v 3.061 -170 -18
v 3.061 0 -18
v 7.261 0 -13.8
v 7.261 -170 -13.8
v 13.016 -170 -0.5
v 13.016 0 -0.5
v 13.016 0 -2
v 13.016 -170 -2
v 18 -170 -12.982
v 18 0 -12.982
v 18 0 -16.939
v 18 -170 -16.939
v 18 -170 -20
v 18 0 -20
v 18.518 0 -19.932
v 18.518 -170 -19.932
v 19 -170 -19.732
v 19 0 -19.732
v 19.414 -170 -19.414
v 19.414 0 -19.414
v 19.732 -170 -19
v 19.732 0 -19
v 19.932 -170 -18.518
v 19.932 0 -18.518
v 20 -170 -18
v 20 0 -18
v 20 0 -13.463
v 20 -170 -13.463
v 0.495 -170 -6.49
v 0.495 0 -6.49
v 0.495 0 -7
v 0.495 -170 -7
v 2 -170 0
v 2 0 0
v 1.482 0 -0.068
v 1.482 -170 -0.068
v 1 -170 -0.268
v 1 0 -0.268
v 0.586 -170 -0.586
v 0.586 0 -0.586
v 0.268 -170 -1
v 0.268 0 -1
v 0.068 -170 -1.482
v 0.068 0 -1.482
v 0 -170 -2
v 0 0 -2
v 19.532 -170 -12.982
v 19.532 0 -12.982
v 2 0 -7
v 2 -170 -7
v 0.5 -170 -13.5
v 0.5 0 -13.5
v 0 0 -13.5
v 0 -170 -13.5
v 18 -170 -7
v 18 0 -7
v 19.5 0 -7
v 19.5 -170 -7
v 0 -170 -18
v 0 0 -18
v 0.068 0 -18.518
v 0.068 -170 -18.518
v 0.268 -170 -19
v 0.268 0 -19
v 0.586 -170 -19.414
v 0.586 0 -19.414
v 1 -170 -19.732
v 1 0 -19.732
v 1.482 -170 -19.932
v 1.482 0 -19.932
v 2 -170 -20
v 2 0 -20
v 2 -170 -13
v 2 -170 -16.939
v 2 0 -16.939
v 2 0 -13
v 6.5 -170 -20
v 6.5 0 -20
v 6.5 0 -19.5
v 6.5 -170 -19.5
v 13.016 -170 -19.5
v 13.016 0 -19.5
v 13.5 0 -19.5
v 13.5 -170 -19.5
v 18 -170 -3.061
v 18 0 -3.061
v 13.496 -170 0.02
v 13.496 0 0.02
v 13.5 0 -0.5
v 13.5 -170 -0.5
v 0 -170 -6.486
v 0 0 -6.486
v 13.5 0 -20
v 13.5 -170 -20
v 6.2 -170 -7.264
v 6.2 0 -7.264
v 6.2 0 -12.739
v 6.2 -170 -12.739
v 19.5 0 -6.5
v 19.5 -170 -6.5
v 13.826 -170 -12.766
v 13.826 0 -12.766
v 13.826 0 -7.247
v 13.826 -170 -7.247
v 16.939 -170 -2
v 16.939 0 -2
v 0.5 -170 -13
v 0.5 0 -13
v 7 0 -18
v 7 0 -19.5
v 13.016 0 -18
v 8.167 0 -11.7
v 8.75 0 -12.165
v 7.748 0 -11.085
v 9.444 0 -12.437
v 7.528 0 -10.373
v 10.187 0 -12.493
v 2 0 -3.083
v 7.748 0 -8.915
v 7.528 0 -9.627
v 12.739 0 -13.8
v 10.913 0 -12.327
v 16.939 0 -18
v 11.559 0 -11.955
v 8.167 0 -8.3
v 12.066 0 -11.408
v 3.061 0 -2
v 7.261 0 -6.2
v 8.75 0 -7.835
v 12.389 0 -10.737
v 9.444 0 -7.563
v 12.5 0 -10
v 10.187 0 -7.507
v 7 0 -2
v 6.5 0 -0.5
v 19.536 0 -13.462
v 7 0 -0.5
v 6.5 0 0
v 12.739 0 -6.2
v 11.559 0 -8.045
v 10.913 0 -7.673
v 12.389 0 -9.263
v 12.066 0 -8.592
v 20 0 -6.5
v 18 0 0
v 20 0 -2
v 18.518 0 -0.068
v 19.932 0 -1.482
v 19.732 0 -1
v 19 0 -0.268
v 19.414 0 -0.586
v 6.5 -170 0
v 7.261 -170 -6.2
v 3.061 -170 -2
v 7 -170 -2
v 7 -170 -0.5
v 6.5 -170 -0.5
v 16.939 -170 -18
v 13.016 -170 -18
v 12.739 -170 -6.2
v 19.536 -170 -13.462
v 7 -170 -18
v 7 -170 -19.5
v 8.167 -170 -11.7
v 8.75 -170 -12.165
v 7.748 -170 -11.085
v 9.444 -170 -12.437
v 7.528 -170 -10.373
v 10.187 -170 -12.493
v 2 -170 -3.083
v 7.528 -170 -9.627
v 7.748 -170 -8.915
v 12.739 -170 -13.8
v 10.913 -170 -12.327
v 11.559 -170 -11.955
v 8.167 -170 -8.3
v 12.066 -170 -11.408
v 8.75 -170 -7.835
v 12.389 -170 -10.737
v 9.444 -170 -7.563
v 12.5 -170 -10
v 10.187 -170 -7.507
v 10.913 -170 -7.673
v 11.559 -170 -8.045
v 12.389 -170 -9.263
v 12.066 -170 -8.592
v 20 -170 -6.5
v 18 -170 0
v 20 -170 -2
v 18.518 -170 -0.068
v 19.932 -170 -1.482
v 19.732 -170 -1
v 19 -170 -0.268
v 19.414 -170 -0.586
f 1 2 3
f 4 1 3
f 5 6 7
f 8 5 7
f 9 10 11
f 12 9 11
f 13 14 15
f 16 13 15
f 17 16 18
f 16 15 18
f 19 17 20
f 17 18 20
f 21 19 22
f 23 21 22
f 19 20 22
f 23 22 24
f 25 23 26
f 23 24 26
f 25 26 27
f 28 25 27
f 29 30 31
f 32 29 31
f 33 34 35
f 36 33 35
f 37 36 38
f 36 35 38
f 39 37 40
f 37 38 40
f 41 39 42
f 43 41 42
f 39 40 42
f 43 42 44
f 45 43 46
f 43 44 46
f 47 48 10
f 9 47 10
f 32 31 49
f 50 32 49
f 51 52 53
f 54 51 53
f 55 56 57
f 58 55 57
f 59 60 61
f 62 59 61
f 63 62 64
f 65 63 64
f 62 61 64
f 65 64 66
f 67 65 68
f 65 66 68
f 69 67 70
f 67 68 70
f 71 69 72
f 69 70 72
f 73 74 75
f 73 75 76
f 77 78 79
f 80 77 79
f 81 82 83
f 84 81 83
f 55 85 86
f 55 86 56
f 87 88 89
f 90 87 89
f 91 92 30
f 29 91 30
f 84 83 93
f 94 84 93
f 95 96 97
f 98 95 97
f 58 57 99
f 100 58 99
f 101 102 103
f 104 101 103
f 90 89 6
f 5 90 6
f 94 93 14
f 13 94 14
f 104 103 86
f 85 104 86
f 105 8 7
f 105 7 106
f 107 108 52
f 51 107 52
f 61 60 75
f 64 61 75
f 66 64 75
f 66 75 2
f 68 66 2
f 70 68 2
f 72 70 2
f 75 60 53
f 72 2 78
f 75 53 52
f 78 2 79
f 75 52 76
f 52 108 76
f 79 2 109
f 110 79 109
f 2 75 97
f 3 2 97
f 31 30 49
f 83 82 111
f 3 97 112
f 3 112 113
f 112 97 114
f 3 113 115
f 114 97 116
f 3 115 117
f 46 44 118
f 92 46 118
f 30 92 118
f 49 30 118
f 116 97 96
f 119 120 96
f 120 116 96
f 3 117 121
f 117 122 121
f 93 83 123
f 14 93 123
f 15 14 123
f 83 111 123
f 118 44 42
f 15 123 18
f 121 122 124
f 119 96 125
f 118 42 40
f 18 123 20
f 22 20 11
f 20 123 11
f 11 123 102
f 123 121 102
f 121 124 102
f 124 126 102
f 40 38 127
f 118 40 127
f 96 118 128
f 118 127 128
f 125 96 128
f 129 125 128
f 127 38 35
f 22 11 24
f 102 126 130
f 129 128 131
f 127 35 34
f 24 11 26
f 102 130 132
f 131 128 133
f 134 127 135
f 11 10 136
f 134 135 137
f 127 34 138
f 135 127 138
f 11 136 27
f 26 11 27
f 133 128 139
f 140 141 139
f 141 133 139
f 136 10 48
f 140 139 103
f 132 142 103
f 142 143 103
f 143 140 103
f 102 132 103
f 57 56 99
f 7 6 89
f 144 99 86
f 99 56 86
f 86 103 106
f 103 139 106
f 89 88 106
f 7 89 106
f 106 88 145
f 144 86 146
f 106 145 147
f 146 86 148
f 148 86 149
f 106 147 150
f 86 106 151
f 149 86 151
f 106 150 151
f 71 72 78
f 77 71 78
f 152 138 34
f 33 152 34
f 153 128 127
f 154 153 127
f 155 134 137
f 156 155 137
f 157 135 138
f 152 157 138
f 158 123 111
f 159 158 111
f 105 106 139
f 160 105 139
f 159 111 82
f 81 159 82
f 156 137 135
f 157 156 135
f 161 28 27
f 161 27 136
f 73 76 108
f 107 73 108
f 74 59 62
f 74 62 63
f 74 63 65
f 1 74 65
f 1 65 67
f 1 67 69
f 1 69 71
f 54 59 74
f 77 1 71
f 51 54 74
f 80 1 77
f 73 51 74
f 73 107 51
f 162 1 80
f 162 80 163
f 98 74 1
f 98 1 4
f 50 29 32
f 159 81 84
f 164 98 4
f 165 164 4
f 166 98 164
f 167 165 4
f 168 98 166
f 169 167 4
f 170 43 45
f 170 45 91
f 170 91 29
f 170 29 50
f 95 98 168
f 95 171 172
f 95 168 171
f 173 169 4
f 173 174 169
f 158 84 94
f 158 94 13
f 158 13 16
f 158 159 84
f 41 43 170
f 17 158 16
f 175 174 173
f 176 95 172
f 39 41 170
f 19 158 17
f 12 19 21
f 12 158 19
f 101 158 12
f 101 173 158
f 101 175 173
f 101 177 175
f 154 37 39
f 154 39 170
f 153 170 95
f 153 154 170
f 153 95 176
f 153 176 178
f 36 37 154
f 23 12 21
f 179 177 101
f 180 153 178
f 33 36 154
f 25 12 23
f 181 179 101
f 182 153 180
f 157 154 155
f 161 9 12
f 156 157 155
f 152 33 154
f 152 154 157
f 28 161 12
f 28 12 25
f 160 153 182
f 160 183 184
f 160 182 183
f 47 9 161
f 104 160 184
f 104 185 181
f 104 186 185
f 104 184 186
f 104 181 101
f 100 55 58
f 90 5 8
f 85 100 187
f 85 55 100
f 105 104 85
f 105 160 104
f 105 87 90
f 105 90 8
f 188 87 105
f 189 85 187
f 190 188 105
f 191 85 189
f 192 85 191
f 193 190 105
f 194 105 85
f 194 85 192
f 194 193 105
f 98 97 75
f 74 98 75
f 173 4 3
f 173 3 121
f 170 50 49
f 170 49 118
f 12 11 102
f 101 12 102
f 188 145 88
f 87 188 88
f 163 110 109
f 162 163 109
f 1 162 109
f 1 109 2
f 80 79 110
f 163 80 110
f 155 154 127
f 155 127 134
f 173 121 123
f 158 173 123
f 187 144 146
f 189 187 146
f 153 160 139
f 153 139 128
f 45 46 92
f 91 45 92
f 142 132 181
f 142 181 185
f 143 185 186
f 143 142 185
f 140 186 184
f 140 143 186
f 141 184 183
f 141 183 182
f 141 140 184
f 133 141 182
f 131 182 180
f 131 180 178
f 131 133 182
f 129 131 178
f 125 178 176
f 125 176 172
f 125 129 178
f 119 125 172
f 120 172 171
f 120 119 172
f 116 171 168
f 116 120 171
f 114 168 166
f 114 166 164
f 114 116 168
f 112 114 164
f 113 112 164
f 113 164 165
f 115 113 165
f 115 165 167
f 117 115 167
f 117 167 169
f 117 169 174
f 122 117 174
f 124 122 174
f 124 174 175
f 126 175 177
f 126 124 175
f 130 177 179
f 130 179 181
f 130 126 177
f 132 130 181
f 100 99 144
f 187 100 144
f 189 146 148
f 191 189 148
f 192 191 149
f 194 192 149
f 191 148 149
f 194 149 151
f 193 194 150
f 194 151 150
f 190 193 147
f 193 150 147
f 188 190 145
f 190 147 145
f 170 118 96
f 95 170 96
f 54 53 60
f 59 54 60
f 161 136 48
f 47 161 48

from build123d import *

# Parameters (mm, degrees)
F0_R     = 2.5
F2_DEPTH = 170


with BuildPart() as f2:
    # F0 (on Front) → F2 (new body)
    with BuildSketch(Plane.XZ):
        with BuildLine():
            Line((6.5, 0), (2, 0))
            ThreePointArc((2, 0), (0.5857864376, -0.5857864376), (0, -2))
            Line((0, -2), (0, -6.4857100192))
            Line((0, -6.4857100192), (0.4948230833, -6.489995392))
            Line((0.4948230833, -6.489995392), (0.4948230833, -7))
            Line((0.4948230833, -7), (2, -7))
            Line((2, -7), (2, -3.0833937817))
            Line((2, -3.0833937817), (6.2, -7.2637052917))
            Line((6.2, -7.2637052917), (6.2, -12.7393398282))
            Line((6.2, -12.7393398282), (2, -16.9393398282))
            Line((2, -16.9393398282), (2, -13))
            Line((2, -13), (0.5, -13))
            Line((0.5, -13), (0.5, -13.5))
            Line((0.5, -13.5), (0, -13.5))
            Line((0, -13.5), (0, -18))
            ThreePointArc((0, -18), (0.5857864376, -19.4142135624), (2, -20))
            Line((2, -20), (6.5, -20))
            Line((6.5, -20), (6.5, -19.5))
            Line((6.5, -19.5), (7, -19.5))
            Line((7, -19.5), (7, -18))
            Line((7, -18), (3.0606601718, -18))
            Line((3.0606601718, -18), (7.2606601718, -13.8))
            Line((7.2606601718, -13.8), (12.7393398282, -13.8))
            Line((12.7393398282, -13.8), (16.9393398282, -18))
            Line((16.9393398282, -18), (13.015800612, -18))
            Line((13.015800612, -18), (13.015800612, -19.5))
            Line((13.015800612, -19.5), (13.5, -19.5))
            Line((13.5, -19.5), (13.5, -20))
            Line((13.5, -20), (18, -20))
            ThreePointArc((18, -20), (19.4142135624, -19.4142135624), (20, -18))
            Line((20, -18), (20, -13.4626608249))
            Line((20, -13.4626608249), (19.5363645284, -13.4624647606))
            Line((19.5363645284, -13.4624647606), (19.532302618, -12.9822008219))
            Line((19.532302618, -12.9822008219), (18, -12.9822008219))
            Line((18, -12.9822008219), (17.9998106987, -16.9393398192))
            Line((17.9998106987, -16.9393398192), (13.8264202785, -12.765949399))
            Line((13.8264202785, -12.765949399), (13.8264202785, -7.246708479))
            Line((13.8264202785, -7.246708479), (17.9998106987, -3.0606601627))
            Line((17.9998106987, -3.0606601627), (17.9998106987, -6.9999999909))
            Line((17.9998106987, -6.9999999909), (19.4998106987, -6.9999999909))
            Line((19.4998106987, -6.9999999909), (19.4998106987, -6.4999999909))
            Line((19.4998106987, -6.4999999909), (20, -6.4999999909))
            Line((20, -6.4999999909), (20, -2))
            ThreePointArc((20, -2), (19.4142135624, -0.5857864376), (18, 0))
            Line((18, 0), (13.4962801728, 0.0202495232))
            Line((13.4962801728, 0.0202495232), (13.5, -0.5))
            Line((13.5, -0.5), (13.015800612, -0.5))
            Line((13.015800612, -0.5), (13.015800612, -2))
            Line((13.015800612, -2), (16.9393398282, -2))
            Line((16.9393398282, -2), (12.7393121854, -6.2000276428))
            Line((12.7393121854, -6.2000276428), (7.2606601718, -6.2))
            Line((7.2606601718, -6.2), (3.0606601718, -2))
            Line((3.0606601718, -2), (7, -2))
            Line((7, -2), (7, -0.5))
            Line((7, -0.5), (6.5, -0.5))
            Line((6.5, -0.5), (6.5, 0))
        make_face()
        with Locations((10, -10)):
            Circle(F0_R, mode=Mode.SUBTRACT)
    extrude(amount=F2_DEPTH)


solid = f2.part
